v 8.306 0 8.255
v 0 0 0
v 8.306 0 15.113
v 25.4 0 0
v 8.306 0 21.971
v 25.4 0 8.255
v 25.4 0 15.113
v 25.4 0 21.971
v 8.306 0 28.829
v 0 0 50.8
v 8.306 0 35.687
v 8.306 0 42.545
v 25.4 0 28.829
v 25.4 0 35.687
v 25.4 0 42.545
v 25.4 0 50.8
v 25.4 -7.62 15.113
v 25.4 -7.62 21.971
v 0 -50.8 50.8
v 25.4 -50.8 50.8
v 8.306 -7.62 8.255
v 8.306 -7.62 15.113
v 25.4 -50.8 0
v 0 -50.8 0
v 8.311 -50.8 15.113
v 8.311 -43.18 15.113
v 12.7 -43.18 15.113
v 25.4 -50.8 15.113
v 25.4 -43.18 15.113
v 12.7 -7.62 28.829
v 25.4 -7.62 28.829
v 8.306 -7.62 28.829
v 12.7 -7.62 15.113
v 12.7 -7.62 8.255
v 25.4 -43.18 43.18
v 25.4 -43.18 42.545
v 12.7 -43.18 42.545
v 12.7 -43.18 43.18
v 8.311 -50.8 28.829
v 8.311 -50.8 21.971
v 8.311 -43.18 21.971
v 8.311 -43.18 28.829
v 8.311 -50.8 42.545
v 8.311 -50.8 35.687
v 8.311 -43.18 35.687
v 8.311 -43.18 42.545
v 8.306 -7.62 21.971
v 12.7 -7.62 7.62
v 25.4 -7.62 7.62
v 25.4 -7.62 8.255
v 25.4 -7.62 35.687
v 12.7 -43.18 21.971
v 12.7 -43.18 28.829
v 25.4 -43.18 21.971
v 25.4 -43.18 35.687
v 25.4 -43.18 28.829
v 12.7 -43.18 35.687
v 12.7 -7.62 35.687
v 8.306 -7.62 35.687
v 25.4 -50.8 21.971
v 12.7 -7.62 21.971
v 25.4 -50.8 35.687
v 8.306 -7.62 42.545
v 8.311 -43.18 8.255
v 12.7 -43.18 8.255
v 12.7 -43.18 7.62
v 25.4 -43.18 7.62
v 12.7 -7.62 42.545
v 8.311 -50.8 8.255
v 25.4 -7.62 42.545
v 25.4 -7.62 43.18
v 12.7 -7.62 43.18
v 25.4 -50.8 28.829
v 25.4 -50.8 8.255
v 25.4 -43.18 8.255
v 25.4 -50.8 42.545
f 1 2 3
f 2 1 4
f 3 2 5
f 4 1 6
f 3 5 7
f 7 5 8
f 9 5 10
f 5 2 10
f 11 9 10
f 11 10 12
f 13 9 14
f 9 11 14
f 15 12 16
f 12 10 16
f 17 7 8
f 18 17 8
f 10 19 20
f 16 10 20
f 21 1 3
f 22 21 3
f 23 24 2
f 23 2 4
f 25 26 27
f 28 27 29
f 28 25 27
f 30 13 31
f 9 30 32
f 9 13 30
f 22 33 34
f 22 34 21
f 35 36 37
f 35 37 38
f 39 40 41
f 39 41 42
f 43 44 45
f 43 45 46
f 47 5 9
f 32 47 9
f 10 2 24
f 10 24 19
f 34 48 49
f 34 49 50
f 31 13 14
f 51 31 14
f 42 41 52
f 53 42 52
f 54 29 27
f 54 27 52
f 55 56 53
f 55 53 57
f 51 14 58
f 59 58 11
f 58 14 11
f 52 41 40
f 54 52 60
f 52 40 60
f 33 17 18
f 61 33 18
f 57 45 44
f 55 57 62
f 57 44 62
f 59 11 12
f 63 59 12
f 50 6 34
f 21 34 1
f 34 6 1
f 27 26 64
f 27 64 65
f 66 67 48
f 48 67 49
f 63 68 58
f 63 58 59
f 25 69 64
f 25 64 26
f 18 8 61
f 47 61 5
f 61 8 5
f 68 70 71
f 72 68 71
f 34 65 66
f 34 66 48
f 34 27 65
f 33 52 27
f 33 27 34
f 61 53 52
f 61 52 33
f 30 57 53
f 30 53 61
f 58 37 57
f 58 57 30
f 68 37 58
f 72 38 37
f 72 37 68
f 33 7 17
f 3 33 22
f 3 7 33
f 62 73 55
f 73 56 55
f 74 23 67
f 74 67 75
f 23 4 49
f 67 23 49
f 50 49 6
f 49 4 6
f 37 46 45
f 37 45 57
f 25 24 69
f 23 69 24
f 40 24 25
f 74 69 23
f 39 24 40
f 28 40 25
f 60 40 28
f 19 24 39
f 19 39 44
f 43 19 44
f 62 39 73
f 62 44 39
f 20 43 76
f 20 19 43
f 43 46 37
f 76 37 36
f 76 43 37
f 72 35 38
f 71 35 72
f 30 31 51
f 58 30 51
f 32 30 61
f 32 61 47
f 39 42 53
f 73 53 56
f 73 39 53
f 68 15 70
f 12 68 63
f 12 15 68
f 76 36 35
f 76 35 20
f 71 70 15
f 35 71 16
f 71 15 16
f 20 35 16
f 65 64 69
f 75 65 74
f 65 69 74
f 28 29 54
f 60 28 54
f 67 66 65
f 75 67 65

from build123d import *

# Parameters (mm, degrees)
F0_W     = 25.4
F0_H     = 50.8
F1_DEPTH = 50.8
F2_W     = 35.56
F2_H     = 35.56
F3_DEPTH = 12.7
F4_W     = 17.088712
F4_H     = 6.858
F5_DEPTH = 7.62
F6_W     = 17.0942
F6_H     = 6.858
F7_DEPTH = 7.62


with BuildPart() as f1:
    # F0 (on Front) → F1 (new body)
    with BuildSketch(Plane.XZ):
        with Locations((12.7, 25.4)):
            Rectangle(F0_W, F0_H)
    extrude(amount=F1_DEPTH)

    # F2 (on face) → F3 (cut)
    with BuildSketch(Plane.YZ.offset(25.4)):
        with Locations((-25.4, 25.4)):
            Rectangle(F2_W, F2_H)
    extrude(amount=-F3_DEPTH, mode=Mode.SUBTRACT)

    # F4 (on face) → F5 (cut)
    with BuildSketch(Plane.XZ.offset(50.8)):
        with Locations((16.855644, 39.116)):
            Rectangle(F4_W, F4_H)
        with Locations((16.855644, 25.4)):
            Rectangle(F4_W, F4_H)
        with Locations((16.855644, 11.684)):
            Rectangle(F4_W, F4_H)
    extrude(amount=-F5_DEPTH, mode=Mode.SUBTRACT)

    # F6 (on face) → F7 (cut)
    with BuildSketch(Plane(origin=(0, 0, 0), x_dir=(-1, 0, 0), z_dir=(0, 1, 0))):
        with Locations((-16.8529, 39.116)):
            Rectangle(F6_W, F6_H)
        with Locations((-16.8529, 25.4)):
            Rectangle(F6_W, F6_H)
        with Locations((-16.8529, 11.684)):
            Rectangle(F6_W, F6_H)
    extrude(amount=-F7_DEPTH, mode=Mode.SUBTRACT)


solid = f1.part
